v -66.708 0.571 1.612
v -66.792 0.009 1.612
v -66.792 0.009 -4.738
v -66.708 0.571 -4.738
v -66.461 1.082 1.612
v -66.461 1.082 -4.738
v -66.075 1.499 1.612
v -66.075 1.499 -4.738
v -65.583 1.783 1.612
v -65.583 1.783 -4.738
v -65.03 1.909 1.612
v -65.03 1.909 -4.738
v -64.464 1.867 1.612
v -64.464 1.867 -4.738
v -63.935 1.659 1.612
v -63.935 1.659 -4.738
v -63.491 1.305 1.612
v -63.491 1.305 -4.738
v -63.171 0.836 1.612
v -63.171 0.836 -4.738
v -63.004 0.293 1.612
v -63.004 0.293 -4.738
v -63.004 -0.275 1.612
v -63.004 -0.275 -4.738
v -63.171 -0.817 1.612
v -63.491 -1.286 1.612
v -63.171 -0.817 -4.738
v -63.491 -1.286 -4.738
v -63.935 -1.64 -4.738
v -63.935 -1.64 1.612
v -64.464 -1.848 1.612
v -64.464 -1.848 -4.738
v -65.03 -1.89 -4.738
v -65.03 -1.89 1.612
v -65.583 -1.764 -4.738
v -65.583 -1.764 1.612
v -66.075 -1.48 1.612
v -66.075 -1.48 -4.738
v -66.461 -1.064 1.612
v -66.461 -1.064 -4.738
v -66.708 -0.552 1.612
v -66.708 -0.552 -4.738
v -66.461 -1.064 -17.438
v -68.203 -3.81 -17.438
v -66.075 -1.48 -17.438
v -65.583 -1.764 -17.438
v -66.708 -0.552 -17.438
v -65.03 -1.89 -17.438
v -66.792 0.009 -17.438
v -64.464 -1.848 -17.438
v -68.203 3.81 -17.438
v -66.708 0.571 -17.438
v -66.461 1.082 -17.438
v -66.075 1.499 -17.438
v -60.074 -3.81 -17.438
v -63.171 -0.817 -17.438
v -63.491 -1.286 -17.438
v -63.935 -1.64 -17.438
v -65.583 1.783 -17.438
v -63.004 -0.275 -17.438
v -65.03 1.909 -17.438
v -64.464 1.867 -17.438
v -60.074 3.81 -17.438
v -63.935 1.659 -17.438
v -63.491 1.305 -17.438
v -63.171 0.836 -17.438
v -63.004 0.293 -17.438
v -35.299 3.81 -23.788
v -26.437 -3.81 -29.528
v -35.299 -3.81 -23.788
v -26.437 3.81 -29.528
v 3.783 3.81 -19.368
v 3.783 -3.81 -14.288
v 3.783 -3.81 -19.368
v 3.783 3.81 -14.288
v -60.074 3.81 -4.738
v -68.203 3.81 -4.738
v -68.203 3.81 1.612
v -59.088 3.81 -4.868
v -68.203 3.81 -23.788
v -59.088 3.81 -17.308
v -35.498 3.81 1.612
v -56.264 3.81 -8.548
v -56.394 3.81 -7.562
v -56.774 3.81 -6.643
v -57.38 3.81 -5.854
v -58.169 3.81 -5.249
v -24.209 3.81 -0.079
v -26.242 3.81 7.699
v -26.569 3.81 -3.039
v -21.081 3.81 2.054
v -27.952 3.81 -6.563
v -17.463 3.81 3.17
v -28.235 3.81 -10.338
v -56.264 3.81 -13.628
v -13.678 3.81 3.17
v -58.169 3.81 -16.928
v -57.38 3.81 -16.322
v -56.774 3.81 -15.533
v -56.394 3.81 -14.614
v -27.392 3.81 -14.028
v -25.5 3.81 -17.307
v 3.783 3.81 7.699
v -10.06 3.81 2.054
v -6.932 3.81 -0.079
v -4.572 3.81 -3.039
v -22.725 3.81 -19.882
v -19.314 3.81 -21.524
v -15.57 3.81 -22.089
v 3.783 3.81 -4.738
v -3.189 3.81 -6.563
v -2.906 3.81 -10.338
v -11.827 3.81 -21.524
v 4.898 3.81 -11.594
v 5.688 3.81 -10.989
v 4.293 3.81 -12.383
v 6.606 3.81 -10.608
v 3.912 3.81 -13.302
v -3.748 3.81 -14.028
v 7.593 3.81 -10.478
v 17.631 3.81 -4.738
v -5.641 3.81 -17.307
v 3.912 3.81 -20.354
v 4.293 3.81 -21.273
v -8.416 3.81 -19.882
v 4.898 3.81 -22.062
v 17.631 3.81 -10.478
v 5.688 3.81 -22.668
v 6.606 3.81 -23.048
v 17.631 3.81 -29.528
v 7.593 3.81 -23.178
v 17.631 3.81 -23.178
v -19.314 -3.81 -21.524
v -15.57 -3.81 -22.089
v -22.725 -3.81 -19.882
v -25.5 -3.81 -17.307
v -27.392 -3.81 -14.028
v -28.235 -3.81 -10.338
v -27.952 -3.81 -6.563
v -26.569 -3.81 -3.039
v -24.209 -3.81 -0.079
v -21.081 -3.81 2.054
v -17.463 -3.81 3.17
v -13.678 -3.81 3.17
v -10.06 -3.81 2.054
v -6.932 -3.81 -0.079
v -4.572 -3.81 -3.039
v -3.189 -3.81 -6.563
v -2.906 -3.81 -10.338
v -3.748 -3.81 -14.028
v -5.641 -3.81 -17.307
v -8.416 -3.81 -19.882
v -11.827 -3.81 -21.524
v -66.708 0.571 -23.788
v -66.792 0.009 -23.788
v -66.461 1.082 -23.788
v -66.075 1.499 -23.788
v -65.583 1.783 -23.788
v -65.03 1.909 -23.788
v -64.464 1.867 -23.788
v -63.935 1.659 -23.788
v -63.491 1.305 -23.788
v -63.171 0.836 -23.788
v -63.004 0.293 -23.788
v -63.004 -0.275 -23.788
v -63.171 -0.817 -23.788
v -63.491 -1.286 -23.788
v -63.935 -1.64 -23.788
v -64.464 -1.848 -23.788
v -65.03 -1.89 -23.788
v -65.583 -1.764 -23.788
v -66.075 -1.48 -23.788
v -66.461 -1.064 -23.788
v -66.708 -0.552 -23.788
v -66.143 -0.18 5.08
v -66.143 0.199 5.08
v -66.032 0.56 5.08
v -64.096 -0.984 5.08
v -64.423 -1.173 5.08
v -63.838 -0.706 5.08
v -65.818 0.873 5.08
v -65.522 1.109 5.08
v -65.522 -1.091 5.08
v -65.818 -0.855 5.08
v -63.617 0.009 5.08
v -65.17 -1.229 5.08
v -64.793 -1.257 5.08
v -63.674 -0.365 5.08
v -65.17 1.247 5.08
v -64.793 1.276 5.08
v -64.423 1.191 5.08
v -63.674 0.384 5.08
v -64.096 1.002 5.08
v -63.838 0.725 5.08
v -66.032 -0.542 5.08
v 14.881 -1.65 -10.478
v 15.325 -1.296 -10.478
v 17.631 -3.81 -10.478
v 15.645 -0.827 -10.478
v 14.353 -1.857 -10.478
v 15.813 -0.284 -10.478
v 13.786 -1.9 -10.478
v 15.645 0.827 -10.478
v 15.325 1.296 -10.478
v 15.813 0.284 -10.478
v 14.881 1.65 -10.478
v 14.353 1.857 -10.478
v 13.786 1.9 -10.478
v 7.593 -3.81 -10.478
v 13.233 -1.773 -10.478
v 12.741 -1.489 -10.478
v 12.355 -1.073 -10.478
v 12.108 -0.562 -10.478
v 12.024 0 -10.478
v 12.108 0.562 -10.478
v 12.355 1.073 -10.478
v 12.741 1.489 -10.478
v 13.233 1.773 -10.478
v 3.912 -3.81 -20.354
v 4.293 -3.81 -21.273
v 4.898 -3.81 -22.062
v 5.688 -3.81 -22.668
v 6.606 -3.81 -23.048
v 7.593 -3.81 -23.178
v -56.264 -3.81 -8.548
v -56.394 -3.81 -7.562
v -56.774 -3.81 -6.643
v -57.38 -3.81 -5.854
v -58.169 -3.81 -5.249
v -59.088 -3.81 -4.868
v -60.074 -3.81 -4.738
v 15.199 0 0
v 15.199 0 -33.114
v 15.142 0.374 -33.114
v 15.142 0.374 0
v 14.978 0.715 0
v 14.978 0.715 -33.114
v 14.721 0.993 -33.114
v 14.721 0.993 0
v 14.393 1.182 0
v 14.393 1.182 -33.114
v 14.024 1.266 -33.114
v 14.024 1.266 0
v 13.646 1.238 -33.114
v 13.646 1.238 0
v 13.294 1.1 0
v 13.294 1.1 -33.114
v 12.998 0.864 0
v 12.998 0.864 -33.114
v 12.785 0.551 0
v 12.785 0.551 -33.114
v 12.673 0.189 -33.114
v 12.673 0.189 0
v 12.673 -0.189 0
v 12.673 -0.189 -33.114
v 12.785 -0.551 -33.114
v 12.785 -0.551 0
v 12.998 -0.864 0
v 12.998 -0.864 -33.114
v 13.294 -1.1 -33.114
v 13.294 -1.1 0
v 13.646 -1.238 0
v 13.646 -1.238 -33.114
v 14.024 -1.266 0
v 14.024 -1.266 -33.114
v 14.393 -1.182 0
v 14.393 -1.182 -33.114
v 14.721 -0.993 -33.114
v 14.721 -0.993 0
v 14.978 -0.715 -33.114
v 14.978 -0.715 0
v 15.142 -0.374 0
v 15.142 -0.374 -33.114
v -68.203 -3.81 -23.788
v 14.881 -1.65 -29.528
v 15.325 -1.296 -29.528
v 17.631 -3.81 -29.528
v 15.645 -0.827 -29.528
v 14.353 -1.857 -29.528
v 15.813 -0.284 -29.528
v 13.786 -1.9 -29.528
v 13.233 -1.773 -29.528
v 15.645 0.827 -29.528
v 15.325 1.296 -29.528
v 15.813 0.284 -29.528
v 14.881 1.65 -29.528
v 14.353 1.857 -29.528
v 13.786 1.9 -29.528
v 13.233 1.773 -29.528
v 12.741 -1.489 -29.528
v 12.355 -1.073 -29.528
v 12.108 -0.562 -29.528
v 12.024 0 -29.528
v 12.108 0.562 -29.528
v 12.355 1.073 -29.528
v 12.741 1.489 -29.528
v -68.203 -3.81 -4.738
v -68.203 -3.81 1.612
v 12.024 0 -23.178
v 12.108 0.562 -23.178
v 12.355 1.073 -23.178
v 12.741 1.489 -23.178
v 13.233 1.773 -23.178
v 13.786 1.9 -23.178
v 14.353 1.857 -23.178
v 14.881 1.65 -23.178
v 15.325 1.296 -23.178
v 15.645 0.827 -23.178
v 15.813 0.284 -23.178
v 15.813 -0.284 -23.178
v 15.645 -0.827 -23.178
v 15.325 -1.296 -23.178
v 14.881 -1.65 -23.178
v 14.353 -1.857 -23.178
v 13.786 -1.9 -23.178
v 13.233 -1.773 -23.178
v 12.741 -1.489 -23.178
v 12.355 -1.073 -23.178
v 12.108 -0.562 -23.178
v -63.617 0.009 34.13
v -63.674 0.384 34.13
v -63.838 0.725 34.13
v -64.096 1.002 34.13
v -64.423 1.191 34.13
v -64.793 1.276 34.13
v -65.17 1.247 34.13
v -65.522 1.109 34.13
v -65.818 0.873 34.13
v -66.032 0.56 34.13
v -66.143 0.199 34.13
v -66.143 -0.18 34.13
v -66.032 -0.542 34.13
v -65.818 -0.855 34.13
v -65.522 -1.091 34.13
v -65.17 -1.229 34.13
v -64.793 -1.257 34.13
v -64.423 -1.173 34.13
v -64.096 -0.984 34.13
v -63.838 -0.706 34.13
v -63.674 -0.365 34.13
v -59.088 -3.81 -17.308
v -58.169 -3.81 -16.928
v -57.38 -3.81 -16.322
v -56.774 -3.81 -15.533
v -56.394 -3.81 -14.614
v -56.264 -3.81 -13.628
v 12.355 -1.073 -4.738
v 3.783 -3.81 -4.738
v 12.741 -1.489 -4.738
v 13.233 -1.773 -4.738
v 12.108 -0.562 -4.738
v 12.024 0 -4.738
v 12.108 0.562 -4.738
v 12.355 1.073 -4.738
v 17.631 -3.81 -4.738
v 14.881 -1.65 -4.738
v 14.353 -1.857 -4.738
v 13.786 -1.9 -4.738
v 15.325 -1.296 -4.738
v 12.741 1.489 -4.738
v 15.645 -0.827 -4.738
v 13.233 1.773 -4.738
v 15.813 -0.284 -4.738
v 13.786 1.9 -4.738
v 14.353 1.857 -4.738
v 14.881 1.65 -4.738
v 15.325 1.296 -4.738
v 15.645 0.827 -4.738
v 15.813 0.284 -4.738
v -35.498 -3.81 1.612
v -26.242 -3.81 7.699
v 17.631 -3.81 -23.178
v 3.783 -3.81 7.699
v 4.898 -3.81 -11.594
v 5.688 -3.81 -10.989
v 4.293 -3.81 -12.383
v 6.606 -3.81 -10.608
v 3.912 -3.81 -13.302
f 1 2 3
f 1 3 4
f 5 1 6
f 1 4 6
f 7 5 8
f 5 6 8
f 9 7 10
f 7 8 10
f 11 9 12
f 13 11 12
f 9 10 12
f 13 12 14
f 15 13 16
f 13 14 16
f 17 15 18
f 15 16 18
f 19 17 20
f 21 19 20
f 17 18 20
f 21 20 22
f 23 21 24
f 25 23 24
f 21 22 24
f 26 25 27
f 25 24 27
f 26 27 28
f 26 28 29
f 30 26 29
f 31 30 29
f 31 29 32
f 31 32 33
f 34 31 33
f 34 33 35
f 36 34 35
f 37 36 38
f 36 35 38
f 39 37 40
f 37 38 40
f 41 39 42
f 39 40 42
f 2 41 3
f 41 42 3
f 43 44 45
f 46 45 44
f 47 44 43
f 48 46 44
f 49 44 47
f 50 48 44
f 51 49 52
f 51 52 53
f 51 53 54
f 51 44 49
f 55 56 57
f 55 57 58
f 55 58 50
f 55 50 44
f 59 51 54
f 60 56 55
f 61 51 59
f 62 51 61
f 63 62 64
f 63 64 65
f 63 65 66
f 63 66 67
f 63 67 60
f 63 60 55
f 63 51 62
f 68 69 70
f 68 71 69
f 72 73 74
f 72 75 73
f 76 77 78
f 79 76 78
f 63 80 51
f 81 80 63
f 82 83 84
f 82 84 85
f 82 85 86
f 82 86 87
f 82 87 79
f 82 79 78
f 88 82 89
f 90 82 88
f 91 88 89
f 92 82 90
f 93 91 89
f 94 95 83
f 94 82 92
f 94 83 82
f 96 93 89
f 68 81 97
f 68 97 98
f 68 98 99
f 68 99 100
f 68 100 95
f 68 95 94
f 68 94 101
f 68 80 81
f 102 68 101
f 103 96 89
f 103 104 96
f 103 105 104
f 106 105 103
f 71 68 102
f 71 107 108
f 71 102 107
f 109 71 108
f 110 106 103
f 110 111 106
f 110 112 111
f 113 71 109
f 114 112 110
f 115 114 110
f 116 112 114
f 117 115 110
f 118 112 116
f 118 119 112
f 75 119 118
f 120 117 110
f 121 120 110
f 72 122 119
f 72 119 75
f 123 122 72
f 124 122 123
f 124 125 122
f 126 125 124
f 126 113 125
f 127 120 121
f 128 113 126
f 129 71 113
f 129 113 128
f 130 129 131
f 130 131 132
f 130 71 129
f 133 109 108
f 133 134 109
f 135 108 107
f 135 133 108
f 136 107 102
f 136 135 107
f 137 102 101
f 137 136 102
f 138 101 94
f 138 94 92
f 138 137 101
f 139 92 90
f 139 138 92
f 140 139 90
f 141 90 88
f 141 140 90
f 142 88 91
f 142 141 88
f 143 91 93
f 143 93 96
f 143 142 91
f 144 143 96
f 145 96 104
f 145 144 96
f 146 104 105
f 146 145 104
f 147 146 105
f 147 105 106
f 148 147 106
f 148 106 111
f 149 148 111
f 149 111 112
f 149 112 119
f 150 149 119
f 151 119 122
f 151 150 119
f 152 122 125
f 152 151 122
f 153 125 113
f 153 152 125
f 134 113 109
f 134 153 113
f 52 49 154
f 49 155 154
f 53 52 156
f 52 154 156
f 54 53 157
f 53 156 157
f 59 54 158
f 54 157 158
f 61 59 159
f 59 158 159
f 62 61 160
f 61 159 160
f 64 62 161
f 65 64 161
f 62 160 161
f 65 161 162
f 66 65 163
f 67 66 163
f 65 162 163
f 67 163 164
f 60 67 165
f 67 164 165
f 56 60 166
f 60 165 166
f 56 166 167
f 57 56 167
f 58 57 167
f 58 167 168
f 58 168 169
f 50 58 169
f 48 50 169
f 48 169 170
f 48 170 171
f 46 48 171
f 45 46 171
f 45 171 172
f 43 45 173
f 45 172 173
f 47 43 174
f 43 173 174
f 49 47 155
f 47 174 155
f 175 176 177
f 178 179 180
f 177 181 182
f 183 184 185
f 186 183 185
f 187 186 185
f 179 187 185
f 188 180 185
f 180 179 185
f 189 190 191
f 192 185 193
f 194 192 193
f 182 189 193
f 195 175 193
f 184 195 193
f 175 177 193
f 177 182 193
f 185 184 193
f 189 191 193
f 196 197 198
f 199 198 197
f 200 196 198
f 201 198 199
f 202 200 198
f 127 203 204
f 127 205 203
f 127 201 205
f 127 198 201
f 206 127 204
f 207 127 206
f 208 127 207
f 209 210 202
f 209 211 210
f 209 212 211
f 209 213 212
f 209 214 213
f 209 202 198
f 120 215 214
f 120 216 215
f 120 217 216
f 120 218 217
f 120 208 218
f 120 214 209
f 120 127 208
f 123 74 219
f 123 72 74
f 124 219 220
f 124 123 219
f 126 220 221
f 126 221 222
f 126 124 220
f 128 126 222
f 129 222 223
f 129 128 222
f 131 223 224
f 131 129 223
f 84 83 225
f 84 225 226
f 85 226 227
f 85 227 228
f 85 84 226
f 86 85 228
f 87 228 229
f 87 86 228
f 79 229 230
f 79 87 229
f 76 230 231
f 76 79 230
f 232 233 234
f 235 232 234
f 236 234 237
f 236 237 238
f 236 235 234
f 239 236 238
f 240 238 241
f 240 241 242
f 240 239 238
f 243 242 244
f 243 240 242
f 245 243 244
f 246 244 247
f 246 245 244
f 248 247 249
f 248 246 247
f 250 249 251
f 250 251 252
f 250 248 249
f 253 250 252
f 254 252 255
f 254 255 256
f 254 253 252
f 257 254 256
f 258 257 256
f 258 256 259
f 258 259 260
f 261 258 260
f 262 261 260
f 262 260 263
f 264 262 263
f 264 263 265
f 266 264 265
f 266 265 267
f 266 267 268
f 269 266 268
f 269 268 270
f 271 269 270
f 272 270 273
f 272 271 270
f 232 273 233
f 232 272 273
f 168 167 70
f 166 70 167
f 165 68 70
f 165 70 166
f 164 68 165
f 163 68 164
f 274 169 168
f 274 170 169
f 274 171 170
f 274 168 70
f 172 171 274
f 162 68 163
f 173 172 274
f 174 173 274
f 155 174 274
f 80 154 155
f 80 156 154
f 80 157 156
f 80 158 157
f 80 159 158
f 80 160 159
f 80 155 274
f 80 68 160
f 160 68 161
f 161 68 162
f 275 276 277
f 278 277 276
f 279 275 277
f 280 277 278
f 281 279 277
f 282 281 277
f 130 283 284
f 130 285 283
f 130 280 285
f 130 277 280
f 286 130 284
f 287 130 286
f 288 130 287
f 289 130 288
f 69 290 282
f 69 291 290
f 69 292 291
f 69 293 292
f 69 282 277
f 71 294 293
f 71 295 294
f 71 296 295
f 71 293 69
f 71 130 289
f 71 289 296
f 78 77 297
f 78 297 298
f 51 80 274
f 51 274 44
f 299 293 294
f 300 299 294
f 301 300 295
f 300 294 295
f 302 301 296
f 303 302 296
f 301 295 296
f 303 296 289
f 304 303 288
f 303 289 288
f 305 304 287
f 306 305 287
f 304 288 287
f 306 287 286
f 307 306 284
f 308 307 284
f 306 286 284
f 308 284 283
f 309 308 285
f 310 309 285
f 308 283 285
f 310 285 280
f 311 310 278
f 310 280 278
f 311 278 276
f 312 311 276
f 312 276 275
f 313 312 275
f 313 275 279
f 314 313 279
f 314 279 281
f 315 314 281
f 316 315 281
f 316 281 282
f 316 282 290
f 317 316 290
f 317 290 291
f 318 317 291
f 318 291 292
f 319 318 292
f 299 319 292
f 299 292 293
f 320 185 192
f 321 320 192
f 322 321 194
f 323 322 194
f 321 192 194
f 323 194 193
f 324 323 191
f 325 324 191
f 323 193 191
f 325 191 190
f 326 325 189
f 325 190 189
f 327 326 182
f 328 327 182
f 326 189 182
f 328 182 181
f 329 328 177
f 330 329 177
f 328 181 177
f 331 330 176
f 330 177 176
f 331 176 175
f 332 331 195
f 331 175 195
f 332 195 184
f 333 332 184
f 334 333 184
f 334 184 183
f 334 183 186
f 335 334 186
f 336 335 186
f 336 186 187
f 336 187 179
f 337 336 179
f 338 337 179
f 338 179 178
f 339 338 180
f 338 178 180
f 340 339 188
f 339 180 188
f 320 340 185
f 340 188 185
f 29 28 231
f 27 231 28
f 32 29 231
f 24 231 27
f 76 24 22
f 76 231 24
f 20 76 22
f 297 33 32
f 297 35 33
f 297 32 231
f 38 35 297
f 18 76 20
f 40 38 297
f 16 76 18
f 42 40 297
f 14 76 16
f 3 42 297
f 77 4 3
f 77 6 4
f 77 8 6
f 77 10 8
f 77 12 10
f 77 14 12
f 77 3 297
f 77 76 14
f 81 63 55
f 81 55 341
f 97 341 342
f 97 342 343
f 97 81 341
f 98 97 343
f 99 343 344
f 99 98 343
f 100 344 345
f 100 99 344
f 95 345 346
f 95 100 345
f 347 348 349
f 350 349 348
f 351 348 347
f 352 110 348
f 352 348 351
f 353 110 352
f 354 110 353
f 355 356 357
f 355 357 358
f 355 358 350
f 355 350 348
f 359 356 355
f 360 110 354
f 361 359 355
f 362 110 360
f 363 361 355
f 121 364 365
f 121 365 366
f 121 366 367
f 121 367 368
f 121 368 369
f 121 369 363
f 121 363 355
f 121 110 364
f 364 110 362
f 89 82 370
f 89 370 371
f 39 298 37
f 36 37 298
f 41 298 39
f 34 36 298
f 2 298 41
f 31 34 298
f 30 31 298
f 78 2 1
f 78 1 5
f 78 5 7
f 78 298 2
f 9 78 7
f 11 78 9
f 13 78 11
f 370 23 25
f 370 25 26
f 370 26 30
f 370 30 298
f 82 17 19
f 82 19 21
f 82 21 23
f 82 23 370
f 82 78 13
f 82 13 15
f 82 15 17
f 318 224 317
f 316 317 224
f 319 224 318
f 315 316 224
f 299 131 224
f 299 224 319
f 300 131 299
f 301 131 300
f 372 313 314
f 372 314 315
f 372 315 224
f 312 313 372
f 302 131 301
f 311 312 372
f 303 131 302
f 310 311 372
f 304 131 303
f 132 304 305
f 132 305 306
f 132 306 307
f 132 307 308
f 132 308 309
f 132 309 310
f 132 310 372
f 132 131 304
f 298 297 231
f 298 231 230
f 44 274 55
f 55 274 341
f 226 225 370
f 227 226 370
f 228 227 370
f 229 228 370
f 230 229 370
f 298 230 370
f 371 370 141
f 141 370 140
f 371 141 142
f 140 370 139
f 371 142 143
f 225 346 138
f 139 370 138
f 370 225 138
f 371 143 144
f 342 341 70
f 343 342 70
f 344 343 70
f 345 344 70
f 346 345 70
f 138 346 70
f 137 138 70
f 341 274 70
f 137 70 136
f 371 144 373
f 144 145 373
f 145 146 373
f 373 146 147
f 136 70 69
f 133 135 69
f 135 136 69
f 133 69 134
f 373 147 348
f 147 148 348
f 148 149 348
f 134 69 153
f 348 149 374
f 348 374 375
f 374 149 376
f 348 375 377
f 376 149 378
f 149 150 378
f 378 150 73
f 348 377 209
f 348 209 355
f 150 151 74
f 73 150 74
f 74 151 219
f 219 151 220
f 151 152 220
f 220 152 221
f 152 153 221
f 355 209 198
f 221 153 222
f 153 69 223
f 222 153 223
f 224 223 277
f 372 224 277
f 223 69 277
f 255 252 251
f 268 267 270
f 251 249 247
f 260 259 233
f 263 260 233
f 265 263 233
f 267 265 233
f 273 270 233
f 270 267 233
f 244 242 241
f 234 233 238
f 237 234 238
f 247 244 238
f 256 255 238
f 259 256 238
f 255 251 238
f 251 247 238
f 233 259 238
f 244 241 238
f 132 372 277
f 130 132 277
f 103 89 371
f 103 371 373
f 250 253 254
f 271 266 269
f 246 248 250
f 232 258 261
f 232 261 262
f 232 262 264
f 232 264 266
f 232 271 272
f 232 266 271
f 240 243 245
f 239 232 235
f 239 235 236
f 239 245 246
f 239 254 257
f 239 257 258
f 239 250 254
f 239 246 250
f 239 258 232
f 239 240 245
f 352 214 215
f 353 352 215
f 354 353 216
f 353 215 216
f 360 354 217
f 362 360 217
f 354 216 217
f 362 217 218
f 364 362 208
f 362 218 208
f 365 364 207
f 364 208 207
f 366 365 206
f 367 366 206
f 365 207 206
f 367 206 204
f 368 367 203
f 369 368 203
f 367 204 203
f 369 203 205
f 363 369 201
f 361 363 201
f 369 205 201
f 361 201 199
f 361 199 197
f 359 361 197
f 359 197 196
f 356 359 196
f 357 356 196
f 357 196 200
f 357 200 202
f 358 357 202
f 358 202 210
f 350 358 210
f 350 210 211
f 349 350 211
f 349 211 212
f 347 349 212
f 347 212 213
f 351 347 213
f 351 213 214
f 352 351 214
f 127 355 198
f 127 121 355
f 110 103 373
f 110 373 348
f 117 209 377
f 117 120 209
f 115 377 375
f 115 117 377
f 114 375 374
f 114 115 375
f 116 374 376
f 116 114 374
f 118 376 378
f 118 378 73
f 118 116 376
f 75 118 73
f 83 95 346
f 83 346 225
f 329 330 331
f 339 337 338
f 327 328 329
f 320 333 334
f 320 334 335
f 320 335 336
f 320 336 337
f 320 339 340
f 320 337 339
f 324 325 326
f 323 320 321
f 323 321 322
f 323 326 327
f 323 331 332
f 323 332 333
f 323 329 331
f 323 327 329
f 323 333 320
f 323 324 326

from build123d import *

# Parameters (mm, degrees)
SKETCH21_R         = 12.7
EXTRUDE1_DEPTH     = 3.81
SKETCH22_R         = 1.905
CUT_EXTRUDE1_DEPTH = 91.7575
SKETCH23_R         = 1.27
EXTRUDE2_DEPTH     = 33.114
EXTRUDE3_START     = 5.08
SKETCH23_3_R       = 1.27
EXTRUDE3_DEPTH     = 29.05


with BuildPart() as part:
    # Sketch21 → Extrude1 (new, symmetric)
    with BuildSketch(Plane(origin=(0, 0, 0), x_dir=(1, 0, 0), z_dir=(0, 1, 0))):
        with BuildLine():
            Line((-35.298929468, 23.7883192), (-68.202843987, 23.7883192))
            Line((-68.202843987, 23.7883192), (-68.202843987, 17.4383192))
            Line((-68.202843987, 17.4383192), (-60.073763005, 17.4383192))
            ThreePointArc((-60.073763005, 17.4383192), (-57.379686169, 16.322396036), (-56.263763005, 13.6283192))
            Line((-56.263763005, 13.6283192), (-56.263763005, 8.5483192))
            ThreePointArc((-56.263763005, 8.5483192), (-57.379686169, 5.854242364), (-60.073763005, 4.7383192))
            Line((-60.073763005, 4.7383192), (-68.202843987, 4.7383192))
            Line((-68.202843987, 4.7383192), (-68.202843987, -1.6116808))
            Line((-68.202843987, -1.6116808), (-35.497864952, -1.6116808))
            Line((-35.497864952, -1.6116808), (-26.24191989, -7.698649627))
            Line((-26.24191989, -7.698649627), (3.782541293, -7.698649627))
            Line((3.782541293, -7.698649627), (3.782541293, 4.7383192))
            Line((3.782541293, 4.7383192), (17.630956358, 4.7383192))
            Line((17.630956358, 4.7383192), (17.630956358, 10.478162824))
            Line((17.630956358, 10.478162824), (7.592541293, 10.478162824))
            ThreePointArc((7.592541293, 10.478162824), (4.898464456, 11.594085988), (3.782541293, 14.288162824))
            Line((3.782541293, 14.288162824), (3.782541293, 19.368162824))
            ThreePointArc((3.782541293, 19.368162824), (4.898464456, 22.062239661), (7.592541293, 23.178162824))
            Line((7.592541293, 23.178162824), (17.630956358, 23.178162824))
            Line((17.630956358, 23.178162824), (17.630956358, 29.528162824))
            Line((17.630956358, 29.528162824), (-26.437102079, 29.528162824))
            Line((-26.437102079, 29.528162824), (-35.298929468, 23.7883192))
        make_face()
        with Locations((-15.570369897, 9.388598571)):
            Circle(SKETCH21_R, mode=Mode.SUBTRACT)
    extrude(amount=EXTRUDE1_DEPTH, both=True)

    # Sketch22 → Cut-Extrude1 (cut, symmetric)
    with BuildSketch(Plane(origin=(0, 0, -29.528162824), x_dir=(-1, 0, 0), z_dir=(0, 0, -1))):
        with Locations((-13.928786076, 0)):
            Circle(SKETCH22_R)
        with Locations((64.887413377, 0.009280662)):
            Circle(SKETCH22_R)
    extrude(amount=CUT_EXTRUDE1_DEPTH, both=True, mode=Mode.SUBTRACT)


with BuildPart() as body_2:
    # Sketch23 → Extrude2 (new body)
    with BuildSketch(Plane.XY):
        with Locations((13.928786076, 0)):
            Circle(SKETCH23_R)
    extrude(amount=-EXTRUDE2_DEPTH)


with BuildPart() as body_3:
    # Sketch23<3> → Extrude3 (new body)
    with BuildSketch(Plane.XY.offset(EXTRUDE3_START)):
        with Locations((-64.887413377, 0.009280662)):
            Circle(SKETCH23_3_R)
    extrude(amount=EXTRUDE3_DEPTH)


solid = Compound([part.part, body_2.part, body_3.part])
